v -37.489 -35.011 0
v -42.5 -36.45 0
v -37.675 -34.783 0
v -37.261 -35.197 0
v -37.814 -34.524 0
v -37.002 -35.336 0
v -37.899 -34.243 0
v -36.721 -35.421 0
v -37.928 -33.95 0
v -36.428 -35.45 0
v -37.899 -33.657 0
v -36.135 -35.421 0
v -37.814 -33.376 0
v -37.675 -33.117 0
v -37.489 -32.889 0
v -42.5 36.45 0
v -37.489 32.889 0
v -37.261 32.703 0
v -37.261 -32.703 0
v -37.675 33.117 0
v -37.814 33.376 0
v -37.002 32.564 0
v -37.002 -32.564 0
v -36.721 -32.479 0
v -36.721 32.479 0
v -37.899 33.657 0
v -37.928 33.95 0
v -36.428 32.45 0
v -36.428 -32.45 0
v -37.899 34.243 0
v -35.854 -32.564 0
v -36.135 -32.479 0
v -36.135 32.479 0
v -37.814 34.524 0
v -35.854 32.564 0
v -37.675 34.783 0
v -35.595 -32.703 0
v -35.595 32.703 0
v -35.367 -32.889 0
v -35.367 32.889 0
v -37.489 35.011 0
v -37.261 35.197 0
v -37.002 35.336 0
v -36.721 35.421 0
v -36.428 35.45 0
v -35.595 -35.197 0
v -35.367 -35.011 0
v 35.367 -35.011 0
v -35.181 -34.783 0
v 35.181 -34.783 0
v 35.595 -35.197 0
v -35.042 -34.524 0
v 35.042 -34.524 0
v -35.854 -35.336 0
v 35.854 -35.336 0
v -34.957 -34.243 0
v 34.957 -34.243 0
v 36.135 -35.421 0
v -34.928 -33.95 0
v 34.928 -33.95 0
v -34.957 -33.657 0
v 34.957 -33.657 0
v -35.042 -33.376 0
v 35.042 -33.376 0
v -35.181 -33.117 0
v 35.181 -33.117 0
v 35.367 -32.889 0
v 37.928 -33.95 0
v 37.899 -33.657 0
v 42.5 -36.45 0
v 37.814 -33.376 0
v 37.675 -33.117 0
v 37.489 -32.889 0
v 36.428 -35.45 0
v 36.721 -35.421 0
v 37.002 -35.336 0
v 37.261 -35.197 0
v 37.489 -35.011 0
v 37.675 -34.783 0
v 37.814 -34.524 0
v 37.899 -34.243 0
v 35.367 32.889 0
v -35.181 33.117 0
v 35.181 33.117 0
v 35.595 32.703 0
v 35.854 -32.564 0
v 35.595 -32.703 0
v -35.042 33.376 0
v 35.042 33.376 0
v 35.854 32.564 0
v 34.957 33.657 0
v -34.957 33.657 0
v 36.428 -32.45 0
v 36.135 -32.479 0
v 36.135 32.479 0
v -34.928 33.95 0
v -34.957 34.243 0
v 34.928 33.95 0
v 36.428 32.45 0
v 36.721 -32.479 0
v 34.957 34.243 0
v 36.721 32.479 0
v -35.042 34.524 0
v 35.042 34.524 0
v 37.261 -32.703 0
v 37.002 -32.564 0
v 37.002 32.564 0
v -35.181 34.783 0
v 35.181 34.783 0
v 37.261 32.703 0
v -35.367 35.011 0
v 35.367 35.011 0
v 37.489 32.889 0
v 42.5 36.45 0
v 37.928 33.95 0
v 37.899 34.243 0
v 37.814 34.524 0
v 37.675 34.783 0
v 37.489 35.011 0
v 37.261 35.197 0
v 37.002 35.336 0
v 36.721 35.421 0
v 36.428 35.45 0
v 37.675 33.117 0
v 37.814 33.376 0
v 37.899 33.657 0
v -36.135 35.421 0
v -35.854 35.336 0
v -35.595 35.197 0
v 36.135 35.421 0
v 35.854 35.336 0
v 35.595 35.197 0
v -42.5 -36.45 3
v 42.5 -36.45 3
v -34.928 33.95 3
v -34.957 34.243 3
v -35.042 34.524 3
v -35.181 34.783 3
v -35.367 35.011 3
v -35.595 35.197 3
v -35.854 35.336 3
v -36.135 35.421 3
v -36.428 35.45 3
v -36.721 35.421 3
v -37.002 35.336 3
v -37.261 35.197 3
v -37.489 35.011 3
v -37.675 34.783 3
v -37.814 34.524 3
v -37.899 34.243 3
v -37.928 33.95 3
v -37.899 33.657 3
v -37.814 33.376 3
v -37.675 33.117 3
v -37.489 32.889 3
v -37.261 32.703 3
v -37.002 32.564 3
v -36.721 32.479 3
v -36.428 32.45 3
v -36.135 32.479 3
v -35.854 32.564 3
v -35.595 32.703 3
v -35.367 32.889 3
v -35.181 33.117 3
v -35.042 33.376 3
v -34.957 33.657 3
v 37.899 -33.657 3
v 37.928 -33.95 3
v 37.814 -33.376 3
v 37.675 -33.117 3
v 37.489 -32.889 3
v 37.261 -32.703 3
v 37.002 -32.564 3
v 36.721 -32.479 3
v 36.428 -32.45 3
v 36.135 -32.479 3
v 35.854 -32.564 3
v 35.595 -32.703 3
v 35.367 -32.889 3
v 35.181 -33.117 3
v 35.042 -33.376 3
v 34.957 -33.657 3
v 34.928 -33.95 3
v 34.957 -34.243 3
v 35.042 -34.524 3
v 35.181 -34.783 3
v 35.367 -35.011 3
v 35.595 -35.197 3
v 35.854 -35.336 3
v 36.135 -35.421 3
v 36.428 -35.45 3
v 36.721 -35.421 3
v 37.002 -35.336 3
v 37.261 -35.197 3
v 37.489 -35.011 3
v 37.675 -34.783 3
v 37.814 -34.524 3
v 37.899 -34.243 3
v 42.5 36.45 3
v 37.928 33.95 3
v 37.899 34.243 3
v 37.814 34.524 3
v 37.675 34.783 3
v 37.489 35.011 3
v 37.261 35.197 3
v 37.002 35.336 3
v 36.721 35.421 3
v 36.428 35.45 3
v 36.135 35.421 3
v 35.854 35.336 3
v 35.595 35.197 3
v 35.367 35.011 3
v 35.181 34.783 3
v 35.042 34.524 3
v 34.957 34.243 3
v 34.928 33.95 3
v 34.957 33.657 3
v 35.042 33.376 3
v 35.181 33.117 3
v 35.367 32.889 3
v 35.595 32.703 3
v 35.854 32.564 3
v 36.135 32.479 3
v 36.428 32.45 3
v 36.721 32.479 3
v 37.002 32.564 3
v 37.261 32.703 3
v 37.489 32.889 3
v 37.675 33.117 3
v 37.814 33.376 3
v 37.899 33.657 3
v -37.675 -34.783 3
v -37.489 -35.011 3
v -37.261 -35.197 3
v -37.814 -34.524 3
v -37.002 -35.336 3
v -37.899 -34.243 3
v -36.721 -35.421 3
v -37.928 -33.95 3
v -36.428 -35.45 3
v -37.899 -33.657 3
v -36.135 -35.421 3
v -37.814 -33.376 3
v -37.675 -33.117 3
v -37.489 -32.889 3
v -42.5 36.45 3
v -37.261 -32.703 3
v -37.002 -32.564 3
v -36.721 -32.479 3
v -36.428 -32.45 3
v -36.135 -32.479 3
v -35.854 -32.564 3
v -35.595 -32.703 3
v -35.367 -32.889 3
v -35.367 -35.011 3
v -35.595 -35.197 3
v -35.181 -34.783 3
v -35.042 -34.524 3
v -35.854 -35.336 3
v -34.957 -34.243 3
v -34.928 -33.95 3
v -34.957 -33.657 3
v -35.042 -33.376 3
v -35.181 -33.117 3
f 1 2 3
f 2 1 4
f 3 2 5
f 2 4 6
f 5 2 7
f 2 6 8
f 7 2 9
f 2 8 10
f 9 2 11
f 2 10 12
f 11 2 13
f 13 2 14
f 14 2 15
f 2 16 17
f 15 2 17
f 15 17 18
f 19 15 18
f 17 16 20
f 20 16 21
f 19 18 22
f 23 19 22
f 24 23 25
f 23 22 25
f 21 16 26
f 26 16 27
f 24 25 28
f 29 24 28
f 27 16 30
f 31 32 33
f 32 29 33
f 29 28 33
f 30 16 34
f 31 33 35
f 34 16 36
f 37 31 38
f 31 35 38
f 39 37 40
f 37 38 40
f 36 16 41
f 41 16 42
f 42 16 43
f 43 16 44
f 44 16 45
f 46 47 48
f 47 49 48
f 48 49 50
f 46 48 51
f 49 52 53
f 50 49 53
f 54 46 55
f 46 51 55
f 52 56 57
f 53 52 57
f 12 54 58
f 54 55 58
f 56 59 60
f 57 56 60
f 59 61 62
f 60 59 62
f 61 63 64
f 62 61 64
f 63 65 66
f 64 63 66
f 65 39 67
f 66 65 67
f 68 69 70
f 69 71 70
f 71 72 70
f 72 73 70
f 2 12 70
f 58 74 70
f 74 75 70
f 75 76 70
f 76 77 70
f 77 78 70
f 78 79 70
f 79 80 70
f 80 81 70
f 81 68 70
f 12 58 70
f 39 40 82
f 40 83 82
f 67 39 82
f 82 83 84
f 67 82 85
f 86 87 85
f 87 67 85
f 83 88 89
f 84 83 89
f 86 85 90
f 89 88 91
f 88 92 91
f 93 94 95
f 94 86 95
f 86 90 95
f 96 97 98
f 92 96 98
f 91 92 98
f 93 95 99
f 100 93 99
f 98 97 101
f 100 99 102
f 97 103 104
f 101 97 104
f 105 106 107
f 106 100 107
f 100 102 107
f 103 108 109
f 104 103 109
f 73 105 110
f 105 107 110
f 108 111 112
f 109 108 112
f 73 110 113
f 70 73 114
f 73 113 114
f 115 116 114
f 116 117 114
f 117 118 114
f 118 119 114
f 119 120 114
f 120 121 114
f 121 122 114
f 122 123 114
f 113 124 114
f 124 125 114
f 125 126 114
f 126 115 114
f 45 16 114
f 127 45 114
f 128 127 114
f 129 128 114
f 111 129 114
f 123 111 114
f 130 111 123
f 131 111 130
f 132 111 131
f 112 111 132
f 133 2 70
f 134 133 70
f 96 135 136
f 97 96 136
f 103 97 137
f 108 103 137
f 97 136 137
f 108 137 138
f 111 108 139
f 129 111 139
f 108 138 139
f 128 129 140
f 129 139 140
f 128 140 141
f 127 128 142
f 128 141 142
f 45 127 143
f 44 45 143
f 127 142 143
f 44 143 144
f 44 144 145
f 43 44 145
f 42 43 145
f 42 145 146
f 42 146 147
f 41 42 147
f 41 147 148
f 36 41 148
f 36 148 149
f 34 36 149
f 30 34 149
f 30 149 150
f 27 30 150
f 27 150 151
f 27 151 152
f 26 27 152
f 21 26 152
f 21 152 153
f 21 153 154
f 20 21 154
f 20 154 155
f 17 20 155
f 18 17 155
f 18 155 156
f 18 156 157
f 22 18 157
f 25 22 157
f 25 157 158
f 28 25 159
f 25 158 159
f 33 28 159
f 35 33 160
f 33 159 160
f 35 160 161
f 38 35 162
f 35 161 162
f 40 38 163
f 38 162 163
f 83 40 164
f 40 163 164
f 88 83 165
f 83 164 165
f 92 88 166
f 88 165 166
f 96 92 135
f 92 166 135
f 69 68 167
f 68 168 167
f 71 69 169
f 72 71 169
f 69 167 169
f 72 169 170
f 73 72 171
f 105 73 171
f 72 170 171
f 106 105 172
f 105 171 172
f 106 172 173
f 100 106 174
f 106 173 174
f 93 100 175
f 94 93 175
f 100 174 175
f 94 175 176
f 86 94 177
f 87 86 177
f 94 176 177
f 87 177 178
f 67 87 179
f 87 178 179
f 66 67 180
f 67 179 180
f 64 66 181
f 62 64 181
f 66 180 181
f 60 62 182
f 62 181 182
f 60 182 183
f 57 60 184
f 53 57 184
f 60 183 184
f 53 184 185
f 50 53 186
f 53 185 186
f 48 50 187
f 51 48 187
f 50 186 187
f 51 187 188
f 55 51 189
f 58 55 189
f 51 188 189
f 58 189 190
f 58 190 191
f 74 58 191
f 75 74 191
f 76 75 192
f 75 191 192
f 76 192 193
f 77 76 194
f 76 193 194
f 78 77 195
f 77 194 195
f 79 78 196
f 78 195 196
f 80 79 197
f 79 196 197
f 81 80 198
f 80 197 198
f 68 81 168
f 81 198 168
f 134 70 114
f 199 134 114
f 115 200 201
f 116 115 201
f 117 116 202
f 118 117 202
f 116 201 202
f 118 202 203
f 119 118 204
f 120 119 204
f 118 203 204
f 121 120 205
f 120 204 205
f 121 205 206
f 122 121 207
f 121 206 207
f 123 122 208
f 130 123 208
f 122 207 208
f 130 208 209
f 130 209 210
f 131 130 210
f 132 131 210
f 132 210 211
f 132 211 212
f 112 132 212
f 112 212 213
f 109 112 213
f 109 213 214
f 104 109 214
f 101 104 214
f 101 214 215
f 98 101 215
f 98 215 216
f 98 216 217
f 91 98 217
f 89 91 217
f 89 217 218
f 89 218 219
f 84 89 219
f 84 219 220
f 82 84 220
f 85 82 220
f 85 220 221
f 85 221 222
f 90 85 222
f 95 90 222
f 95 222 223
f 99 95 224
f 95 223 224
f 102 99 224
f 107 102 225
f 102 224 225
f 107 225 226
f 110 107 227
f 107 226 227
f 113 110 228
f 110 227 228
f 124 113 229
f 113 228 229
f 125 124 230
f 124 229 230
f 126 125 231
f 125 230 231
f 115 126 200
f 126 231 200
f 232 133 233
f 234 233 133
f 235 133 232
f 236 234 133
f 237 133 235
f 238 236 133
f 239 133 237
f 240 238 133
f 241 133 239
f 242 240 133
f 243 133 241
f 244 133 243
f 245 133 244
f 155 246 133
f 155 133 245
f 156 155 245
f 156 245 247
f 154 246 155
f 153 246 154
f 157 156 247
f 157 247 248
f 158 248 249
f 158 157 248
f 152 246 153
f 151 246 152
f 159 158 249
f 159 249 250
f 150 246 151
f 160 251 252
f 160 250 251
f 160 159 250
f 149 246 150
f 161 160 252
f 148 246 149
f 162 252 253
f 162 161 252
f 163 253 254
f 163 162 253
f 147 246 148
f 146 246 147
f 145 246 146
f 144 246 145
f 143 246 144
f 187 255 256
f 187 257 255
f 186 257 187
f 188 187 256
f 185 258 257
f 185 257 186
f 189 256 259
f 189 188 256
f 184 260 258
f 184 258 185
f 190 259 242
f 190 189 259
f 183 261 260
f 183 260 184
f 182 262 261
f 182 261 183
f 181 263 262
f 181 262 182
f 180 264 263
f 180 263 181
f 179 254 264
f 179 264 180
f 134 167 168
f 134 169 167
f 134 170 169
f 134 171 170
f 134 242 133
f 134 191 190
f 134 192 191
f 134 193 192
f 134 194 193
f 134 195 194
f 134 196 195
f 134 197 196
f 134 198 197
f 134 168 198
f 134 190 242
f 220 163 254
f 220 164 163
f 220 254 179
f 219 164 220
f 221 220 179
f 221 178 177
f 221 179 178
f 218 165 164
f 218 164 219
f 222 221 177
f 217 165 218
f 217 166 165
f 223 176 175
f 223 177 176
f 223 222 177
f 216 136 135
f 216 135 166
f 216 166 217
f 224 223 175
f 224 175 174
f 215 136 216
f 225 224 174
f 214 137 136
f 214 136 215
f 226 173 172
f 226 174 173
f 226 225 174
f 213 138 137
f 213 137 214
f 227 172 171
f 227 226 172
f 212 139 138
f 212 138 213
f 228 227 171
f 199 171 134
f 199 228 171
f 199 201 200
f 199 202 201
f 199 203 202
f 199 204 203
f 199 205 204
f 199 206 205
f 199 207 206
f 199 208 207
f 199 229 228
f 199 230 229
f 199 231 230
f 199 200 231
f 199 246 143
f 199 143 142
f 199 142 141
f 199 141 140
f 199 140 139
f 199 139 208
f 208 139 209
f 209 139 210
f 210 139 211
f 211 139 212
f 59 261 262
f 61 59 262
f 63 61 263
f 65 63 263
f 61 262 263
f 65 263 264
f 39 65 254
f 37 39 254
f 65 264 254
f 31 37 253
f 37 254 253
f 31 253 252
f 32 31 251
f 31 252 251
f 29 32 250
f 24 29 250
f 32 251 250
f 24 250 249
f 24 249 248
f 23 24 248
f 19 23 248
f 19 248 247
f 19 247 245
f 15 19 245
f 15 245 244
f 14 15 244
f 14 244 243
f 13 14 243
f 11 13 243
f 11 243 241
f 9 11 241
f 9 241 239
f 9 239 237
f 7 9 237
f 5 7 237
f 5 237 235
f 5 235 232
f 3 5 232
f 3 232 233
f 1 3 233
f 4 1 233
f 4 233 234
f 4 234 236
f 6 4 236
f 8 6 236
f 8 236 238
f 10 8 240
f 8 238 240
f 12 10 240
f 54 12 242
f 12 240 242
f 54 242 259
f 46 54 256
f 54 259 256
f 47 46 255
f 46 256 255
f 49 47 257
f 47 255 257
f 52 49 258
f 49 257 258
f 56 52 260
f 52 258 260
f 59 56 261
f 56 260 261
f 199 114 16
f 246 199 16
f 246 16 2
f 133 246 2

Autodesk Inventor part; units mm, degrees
ref_plane "YZ Plane" through (0, 0, 0) normal (1, 0, 0) x (0, 1, 0)
ref_plane "XZ Plane" through (0, 0, 0) normal (0, 1, 0) x (-1, 0, 0)
ref_plane "XY Plane" through (0, 0, 0) normal (0, 0, 1) x (1, 0, 0)
sketch "Sketch1" plane through (0, 0, 0) normal (0, 0, 1) x (1, 0, 0)
  line L0 (-42.5, -36.45) -> (42.5, -36.45)
  line L1 (42.5, -36.45) -> (42.5, 36.45)
  line L2 (42.5, 36.45) -> (-42.5, 36.45)
  line L3 (-42.5, 36.45) -> (-42.5, -36.45)
  line L4 (-42.5, -36.45) -> (42.5, 36.45) construction
  line L5 (42.5, -36.45) -> (-42.5, 36.45) construction
  point P0 (0, 0)
  dimension "d0" = 85
  dimension "d1" = 72.9
extrude "Extrusion1" add sketch "Sketch1" along normal blind 3
sketch "Sketch2" plane through (0, 0, 3) normal (0, 0, 1) x (1, 0, 0)
  circle A0 centre (-36.428, 33.95) radius 1.5
  circle A1 centre (36.428, 33.95) radius 1.5
  circle A2 centre (-36.428, -33.95) radius 1.5
  circle A3 centre (36.428, -33.95) radius 1.5
  line L0 (-42.5, 36.45) -> (-42.5, -36.45) projected
  line L1 (42.5, 36.45) -> (-42.5, 36.45) projected
  line L2 (42.5, -36.45) -> (42.5, 36.45) projected
  line L3 (-42.5, -36.45) -> (42.5, -36.45) projected
  point P0 (0, 0)
  dimension "d4" = 3
  dimension "d5" = 3
  dimension "d6" = 3
  dimension "d7" = 6.072
  dimension "d8" = 2.5
  dimension "d9" = 2.5
  dimension "d10" = 6.072
  dimension "d11" = 2.5
  dimension "d12" = 6.072
  dimension "d13" = 6.072
  dimension "d14" = 2.5
extrude "Extrusion2" cut sketch "Sketch2" against normal blind 10 contours A0 | A1 | A2 | A3
properties part number "tapa"
